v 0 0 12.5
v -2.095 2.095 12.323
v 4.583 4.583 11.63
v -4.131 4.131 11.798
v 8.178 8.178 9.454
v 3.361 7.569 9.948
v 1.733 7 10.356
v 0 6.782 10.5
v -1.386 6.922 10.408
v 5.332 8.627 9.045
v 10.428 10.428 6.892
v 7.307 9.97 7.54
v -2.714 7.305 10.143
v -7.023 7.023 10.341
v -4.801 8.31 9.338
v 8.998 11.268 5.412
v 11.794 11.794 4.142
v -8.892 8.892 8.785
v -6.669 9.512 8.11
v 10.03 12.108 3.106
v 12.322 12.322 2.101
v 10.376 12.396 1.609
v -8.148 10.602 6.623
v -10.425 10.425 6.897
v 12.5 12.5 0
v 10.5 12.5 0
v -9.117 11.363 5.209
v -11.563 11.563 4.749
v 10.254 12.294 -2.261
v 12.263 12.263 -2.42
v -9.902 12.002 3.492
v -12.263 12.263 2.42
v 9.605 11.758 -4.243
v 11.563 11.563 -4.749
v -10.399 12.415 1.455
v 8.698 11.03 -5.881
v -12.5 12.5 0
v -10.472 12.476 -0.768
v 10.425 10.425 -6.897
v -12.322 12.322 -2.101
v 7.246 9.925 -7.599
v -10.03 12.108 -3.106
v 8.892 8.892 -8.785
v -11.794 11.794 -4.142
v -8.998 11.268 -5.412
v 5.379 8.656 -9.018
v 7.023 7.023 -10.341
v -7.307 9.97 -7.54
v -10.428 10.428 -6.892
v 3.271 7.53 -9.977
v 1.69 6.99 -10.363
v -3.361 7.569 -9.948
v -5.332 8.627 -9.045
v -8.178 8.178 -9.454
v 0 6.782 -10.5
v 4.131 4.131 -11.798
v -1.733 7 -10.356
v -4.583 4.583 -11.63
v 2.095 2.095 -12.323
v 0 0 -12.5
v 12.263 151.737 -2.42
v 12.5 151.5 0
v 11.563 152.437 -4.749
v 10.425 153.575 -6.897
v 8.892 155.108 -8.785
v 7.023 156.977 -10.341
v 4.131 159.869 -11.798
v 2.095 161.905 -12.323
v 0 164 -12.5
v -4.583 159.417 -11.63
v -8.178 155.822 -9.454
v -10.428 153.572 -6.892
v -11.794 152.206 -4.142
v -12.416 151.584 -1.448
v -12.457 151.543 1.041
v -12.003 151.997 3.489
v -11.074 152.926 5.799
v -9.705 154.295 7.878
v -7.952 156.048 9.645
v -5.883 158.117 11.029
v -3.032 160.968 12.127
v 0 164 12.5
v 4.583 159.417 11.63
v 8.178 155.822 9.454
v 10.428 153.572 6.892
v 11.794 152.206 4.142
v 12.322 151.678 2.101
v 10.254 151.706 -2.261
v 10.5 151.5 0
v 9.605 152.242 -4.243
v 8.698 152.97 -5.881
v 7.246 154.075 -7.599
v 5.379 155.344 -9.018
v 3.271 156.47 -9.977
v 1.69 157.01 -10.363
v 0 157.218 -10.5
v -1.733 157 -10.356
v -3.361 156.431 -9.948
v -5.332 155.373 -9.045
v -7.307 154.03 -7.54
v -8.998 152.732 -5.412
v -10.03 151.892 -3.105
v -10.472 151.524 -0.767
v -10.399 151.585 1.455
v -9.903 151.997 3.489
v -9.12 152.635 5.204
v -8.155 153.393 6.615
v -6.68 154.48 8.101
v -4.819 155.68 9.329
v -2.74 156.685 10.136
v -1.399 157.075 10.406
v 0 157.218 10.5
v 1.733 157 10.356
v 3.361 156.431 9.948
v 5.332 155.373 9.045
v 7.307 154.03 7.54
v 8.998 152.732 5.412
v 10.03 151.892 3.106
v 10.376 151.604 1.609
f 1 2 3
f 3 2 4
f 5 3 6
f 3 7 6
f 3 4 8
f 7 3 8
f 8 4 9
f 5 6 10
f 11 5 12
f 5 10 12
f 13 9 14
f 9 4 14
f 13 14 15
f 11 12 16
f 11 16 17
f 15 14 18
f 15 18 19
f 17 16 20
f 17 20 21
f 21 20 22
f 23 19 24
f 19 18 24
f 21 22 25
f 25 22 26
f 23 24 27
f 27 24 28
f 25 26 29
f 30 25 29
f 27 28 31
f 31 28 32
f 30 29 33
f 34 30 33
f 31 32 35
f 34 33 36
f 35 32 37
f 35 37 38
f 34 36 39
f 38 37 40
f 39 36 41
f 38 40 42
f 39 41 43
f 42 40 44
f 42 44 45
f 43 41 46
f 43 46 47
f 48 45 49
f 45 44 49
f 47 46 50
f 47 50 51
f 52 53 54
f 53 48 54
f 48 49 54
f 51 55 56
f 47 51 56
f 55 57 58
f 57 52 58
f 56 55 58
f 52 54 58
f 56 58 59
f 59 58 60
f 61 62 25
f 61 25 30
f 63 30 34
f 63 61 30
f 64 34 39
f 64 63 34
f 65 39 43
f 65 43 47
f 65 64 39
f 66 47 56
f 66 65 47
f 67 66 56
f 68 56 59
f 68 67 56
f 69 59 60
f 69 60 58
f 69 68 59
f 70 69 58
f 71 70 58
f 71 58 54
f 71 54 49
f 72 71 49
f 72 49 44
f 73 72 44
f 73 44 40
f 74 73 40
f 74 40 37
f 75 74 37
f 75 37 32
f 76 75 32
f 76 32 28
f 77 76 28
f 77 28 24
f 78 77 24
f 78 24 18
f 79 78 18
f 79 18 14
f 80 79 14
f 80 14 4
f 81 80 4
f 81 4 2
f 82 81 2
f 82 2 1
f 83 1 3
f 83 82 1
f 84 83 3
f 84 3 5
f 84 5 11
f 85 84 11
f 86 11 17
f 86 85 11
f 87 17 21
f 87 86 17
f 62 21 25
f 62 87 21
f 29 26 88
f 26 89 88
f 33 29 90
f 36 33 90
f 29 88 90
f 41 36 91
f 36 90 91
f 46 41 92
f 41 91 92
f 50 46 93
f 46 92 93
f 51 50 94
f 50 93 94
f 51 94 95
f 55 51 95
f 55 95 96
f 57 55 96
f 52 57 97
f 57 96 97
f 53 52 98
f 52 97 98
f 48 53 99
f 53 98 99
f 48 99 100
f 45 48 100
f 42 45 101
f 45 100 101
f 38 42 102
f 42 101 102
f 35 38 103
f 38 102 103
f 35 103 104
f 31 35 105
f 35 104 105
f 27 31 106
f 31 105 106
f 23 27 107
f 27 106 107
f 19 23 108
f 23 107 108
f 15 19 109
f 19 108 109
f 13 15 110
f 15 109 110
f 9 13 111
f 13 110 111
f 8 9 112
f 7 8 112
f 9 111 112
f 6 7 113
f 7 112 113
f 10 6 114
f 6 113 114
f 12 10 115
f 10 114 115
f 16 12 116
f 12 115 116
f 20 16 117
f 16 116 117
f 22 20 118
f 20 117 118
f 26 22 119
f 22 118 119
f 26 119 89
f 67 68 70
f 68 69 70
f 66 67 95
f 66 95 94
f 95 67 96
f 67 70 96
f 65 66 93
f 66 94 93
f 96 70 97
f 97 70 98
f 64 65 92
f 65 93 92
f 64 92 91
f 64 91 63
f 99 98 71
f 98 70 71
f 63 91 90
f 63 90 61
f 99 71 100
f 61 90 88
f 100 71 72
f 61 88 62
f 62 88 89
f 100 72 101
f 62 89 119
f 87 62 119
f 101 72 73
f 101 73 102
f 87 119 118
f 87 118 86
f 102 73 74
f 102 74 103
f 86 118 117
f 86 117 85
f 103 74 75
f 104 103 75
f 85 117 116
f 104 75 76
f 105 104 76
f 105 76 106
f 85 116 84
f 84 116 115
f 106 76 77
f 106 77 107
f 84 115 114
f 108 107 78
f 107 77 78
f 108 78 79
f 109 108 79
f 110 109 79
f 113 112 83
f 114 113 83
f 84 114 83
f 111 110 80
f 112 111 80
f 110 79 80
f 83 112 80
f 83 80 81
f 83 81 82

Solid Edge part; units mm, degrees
sketch "Sketch1" plane through (0, 0, 0) normal (0, 0, 1) x (1, 0, 0)
  line L0 (0, 0) -> (0, 164)
  dimension "D1" = 164
sketch "Sketch2" plane through (0, 0, 0) normal (0, -1, 0) x (1, 0, 0)
  circle A0 centre (0, 0) radius 12.5
sweep "SweptProtrusion_1" add profiles "Sketch2" path "Sketch1"
shell "Thinwall_1" thickness 2 removed faces 2 at (-8.0833, 0, 8.5833) at (-8.0833, 164, 8.5833)
sketch "Sketch3" plane through (0, 0, 0) normal (1, 0, 0) x (0, 1, 0)
  circle A0 centre (0, 0) radius 12.5
  circle A1 centre (164, 0) radius 12.5
extrude "Cutout1" cut sketch "Sketch3" along normal through all and the other way through all
properties material "Stainless steel"
